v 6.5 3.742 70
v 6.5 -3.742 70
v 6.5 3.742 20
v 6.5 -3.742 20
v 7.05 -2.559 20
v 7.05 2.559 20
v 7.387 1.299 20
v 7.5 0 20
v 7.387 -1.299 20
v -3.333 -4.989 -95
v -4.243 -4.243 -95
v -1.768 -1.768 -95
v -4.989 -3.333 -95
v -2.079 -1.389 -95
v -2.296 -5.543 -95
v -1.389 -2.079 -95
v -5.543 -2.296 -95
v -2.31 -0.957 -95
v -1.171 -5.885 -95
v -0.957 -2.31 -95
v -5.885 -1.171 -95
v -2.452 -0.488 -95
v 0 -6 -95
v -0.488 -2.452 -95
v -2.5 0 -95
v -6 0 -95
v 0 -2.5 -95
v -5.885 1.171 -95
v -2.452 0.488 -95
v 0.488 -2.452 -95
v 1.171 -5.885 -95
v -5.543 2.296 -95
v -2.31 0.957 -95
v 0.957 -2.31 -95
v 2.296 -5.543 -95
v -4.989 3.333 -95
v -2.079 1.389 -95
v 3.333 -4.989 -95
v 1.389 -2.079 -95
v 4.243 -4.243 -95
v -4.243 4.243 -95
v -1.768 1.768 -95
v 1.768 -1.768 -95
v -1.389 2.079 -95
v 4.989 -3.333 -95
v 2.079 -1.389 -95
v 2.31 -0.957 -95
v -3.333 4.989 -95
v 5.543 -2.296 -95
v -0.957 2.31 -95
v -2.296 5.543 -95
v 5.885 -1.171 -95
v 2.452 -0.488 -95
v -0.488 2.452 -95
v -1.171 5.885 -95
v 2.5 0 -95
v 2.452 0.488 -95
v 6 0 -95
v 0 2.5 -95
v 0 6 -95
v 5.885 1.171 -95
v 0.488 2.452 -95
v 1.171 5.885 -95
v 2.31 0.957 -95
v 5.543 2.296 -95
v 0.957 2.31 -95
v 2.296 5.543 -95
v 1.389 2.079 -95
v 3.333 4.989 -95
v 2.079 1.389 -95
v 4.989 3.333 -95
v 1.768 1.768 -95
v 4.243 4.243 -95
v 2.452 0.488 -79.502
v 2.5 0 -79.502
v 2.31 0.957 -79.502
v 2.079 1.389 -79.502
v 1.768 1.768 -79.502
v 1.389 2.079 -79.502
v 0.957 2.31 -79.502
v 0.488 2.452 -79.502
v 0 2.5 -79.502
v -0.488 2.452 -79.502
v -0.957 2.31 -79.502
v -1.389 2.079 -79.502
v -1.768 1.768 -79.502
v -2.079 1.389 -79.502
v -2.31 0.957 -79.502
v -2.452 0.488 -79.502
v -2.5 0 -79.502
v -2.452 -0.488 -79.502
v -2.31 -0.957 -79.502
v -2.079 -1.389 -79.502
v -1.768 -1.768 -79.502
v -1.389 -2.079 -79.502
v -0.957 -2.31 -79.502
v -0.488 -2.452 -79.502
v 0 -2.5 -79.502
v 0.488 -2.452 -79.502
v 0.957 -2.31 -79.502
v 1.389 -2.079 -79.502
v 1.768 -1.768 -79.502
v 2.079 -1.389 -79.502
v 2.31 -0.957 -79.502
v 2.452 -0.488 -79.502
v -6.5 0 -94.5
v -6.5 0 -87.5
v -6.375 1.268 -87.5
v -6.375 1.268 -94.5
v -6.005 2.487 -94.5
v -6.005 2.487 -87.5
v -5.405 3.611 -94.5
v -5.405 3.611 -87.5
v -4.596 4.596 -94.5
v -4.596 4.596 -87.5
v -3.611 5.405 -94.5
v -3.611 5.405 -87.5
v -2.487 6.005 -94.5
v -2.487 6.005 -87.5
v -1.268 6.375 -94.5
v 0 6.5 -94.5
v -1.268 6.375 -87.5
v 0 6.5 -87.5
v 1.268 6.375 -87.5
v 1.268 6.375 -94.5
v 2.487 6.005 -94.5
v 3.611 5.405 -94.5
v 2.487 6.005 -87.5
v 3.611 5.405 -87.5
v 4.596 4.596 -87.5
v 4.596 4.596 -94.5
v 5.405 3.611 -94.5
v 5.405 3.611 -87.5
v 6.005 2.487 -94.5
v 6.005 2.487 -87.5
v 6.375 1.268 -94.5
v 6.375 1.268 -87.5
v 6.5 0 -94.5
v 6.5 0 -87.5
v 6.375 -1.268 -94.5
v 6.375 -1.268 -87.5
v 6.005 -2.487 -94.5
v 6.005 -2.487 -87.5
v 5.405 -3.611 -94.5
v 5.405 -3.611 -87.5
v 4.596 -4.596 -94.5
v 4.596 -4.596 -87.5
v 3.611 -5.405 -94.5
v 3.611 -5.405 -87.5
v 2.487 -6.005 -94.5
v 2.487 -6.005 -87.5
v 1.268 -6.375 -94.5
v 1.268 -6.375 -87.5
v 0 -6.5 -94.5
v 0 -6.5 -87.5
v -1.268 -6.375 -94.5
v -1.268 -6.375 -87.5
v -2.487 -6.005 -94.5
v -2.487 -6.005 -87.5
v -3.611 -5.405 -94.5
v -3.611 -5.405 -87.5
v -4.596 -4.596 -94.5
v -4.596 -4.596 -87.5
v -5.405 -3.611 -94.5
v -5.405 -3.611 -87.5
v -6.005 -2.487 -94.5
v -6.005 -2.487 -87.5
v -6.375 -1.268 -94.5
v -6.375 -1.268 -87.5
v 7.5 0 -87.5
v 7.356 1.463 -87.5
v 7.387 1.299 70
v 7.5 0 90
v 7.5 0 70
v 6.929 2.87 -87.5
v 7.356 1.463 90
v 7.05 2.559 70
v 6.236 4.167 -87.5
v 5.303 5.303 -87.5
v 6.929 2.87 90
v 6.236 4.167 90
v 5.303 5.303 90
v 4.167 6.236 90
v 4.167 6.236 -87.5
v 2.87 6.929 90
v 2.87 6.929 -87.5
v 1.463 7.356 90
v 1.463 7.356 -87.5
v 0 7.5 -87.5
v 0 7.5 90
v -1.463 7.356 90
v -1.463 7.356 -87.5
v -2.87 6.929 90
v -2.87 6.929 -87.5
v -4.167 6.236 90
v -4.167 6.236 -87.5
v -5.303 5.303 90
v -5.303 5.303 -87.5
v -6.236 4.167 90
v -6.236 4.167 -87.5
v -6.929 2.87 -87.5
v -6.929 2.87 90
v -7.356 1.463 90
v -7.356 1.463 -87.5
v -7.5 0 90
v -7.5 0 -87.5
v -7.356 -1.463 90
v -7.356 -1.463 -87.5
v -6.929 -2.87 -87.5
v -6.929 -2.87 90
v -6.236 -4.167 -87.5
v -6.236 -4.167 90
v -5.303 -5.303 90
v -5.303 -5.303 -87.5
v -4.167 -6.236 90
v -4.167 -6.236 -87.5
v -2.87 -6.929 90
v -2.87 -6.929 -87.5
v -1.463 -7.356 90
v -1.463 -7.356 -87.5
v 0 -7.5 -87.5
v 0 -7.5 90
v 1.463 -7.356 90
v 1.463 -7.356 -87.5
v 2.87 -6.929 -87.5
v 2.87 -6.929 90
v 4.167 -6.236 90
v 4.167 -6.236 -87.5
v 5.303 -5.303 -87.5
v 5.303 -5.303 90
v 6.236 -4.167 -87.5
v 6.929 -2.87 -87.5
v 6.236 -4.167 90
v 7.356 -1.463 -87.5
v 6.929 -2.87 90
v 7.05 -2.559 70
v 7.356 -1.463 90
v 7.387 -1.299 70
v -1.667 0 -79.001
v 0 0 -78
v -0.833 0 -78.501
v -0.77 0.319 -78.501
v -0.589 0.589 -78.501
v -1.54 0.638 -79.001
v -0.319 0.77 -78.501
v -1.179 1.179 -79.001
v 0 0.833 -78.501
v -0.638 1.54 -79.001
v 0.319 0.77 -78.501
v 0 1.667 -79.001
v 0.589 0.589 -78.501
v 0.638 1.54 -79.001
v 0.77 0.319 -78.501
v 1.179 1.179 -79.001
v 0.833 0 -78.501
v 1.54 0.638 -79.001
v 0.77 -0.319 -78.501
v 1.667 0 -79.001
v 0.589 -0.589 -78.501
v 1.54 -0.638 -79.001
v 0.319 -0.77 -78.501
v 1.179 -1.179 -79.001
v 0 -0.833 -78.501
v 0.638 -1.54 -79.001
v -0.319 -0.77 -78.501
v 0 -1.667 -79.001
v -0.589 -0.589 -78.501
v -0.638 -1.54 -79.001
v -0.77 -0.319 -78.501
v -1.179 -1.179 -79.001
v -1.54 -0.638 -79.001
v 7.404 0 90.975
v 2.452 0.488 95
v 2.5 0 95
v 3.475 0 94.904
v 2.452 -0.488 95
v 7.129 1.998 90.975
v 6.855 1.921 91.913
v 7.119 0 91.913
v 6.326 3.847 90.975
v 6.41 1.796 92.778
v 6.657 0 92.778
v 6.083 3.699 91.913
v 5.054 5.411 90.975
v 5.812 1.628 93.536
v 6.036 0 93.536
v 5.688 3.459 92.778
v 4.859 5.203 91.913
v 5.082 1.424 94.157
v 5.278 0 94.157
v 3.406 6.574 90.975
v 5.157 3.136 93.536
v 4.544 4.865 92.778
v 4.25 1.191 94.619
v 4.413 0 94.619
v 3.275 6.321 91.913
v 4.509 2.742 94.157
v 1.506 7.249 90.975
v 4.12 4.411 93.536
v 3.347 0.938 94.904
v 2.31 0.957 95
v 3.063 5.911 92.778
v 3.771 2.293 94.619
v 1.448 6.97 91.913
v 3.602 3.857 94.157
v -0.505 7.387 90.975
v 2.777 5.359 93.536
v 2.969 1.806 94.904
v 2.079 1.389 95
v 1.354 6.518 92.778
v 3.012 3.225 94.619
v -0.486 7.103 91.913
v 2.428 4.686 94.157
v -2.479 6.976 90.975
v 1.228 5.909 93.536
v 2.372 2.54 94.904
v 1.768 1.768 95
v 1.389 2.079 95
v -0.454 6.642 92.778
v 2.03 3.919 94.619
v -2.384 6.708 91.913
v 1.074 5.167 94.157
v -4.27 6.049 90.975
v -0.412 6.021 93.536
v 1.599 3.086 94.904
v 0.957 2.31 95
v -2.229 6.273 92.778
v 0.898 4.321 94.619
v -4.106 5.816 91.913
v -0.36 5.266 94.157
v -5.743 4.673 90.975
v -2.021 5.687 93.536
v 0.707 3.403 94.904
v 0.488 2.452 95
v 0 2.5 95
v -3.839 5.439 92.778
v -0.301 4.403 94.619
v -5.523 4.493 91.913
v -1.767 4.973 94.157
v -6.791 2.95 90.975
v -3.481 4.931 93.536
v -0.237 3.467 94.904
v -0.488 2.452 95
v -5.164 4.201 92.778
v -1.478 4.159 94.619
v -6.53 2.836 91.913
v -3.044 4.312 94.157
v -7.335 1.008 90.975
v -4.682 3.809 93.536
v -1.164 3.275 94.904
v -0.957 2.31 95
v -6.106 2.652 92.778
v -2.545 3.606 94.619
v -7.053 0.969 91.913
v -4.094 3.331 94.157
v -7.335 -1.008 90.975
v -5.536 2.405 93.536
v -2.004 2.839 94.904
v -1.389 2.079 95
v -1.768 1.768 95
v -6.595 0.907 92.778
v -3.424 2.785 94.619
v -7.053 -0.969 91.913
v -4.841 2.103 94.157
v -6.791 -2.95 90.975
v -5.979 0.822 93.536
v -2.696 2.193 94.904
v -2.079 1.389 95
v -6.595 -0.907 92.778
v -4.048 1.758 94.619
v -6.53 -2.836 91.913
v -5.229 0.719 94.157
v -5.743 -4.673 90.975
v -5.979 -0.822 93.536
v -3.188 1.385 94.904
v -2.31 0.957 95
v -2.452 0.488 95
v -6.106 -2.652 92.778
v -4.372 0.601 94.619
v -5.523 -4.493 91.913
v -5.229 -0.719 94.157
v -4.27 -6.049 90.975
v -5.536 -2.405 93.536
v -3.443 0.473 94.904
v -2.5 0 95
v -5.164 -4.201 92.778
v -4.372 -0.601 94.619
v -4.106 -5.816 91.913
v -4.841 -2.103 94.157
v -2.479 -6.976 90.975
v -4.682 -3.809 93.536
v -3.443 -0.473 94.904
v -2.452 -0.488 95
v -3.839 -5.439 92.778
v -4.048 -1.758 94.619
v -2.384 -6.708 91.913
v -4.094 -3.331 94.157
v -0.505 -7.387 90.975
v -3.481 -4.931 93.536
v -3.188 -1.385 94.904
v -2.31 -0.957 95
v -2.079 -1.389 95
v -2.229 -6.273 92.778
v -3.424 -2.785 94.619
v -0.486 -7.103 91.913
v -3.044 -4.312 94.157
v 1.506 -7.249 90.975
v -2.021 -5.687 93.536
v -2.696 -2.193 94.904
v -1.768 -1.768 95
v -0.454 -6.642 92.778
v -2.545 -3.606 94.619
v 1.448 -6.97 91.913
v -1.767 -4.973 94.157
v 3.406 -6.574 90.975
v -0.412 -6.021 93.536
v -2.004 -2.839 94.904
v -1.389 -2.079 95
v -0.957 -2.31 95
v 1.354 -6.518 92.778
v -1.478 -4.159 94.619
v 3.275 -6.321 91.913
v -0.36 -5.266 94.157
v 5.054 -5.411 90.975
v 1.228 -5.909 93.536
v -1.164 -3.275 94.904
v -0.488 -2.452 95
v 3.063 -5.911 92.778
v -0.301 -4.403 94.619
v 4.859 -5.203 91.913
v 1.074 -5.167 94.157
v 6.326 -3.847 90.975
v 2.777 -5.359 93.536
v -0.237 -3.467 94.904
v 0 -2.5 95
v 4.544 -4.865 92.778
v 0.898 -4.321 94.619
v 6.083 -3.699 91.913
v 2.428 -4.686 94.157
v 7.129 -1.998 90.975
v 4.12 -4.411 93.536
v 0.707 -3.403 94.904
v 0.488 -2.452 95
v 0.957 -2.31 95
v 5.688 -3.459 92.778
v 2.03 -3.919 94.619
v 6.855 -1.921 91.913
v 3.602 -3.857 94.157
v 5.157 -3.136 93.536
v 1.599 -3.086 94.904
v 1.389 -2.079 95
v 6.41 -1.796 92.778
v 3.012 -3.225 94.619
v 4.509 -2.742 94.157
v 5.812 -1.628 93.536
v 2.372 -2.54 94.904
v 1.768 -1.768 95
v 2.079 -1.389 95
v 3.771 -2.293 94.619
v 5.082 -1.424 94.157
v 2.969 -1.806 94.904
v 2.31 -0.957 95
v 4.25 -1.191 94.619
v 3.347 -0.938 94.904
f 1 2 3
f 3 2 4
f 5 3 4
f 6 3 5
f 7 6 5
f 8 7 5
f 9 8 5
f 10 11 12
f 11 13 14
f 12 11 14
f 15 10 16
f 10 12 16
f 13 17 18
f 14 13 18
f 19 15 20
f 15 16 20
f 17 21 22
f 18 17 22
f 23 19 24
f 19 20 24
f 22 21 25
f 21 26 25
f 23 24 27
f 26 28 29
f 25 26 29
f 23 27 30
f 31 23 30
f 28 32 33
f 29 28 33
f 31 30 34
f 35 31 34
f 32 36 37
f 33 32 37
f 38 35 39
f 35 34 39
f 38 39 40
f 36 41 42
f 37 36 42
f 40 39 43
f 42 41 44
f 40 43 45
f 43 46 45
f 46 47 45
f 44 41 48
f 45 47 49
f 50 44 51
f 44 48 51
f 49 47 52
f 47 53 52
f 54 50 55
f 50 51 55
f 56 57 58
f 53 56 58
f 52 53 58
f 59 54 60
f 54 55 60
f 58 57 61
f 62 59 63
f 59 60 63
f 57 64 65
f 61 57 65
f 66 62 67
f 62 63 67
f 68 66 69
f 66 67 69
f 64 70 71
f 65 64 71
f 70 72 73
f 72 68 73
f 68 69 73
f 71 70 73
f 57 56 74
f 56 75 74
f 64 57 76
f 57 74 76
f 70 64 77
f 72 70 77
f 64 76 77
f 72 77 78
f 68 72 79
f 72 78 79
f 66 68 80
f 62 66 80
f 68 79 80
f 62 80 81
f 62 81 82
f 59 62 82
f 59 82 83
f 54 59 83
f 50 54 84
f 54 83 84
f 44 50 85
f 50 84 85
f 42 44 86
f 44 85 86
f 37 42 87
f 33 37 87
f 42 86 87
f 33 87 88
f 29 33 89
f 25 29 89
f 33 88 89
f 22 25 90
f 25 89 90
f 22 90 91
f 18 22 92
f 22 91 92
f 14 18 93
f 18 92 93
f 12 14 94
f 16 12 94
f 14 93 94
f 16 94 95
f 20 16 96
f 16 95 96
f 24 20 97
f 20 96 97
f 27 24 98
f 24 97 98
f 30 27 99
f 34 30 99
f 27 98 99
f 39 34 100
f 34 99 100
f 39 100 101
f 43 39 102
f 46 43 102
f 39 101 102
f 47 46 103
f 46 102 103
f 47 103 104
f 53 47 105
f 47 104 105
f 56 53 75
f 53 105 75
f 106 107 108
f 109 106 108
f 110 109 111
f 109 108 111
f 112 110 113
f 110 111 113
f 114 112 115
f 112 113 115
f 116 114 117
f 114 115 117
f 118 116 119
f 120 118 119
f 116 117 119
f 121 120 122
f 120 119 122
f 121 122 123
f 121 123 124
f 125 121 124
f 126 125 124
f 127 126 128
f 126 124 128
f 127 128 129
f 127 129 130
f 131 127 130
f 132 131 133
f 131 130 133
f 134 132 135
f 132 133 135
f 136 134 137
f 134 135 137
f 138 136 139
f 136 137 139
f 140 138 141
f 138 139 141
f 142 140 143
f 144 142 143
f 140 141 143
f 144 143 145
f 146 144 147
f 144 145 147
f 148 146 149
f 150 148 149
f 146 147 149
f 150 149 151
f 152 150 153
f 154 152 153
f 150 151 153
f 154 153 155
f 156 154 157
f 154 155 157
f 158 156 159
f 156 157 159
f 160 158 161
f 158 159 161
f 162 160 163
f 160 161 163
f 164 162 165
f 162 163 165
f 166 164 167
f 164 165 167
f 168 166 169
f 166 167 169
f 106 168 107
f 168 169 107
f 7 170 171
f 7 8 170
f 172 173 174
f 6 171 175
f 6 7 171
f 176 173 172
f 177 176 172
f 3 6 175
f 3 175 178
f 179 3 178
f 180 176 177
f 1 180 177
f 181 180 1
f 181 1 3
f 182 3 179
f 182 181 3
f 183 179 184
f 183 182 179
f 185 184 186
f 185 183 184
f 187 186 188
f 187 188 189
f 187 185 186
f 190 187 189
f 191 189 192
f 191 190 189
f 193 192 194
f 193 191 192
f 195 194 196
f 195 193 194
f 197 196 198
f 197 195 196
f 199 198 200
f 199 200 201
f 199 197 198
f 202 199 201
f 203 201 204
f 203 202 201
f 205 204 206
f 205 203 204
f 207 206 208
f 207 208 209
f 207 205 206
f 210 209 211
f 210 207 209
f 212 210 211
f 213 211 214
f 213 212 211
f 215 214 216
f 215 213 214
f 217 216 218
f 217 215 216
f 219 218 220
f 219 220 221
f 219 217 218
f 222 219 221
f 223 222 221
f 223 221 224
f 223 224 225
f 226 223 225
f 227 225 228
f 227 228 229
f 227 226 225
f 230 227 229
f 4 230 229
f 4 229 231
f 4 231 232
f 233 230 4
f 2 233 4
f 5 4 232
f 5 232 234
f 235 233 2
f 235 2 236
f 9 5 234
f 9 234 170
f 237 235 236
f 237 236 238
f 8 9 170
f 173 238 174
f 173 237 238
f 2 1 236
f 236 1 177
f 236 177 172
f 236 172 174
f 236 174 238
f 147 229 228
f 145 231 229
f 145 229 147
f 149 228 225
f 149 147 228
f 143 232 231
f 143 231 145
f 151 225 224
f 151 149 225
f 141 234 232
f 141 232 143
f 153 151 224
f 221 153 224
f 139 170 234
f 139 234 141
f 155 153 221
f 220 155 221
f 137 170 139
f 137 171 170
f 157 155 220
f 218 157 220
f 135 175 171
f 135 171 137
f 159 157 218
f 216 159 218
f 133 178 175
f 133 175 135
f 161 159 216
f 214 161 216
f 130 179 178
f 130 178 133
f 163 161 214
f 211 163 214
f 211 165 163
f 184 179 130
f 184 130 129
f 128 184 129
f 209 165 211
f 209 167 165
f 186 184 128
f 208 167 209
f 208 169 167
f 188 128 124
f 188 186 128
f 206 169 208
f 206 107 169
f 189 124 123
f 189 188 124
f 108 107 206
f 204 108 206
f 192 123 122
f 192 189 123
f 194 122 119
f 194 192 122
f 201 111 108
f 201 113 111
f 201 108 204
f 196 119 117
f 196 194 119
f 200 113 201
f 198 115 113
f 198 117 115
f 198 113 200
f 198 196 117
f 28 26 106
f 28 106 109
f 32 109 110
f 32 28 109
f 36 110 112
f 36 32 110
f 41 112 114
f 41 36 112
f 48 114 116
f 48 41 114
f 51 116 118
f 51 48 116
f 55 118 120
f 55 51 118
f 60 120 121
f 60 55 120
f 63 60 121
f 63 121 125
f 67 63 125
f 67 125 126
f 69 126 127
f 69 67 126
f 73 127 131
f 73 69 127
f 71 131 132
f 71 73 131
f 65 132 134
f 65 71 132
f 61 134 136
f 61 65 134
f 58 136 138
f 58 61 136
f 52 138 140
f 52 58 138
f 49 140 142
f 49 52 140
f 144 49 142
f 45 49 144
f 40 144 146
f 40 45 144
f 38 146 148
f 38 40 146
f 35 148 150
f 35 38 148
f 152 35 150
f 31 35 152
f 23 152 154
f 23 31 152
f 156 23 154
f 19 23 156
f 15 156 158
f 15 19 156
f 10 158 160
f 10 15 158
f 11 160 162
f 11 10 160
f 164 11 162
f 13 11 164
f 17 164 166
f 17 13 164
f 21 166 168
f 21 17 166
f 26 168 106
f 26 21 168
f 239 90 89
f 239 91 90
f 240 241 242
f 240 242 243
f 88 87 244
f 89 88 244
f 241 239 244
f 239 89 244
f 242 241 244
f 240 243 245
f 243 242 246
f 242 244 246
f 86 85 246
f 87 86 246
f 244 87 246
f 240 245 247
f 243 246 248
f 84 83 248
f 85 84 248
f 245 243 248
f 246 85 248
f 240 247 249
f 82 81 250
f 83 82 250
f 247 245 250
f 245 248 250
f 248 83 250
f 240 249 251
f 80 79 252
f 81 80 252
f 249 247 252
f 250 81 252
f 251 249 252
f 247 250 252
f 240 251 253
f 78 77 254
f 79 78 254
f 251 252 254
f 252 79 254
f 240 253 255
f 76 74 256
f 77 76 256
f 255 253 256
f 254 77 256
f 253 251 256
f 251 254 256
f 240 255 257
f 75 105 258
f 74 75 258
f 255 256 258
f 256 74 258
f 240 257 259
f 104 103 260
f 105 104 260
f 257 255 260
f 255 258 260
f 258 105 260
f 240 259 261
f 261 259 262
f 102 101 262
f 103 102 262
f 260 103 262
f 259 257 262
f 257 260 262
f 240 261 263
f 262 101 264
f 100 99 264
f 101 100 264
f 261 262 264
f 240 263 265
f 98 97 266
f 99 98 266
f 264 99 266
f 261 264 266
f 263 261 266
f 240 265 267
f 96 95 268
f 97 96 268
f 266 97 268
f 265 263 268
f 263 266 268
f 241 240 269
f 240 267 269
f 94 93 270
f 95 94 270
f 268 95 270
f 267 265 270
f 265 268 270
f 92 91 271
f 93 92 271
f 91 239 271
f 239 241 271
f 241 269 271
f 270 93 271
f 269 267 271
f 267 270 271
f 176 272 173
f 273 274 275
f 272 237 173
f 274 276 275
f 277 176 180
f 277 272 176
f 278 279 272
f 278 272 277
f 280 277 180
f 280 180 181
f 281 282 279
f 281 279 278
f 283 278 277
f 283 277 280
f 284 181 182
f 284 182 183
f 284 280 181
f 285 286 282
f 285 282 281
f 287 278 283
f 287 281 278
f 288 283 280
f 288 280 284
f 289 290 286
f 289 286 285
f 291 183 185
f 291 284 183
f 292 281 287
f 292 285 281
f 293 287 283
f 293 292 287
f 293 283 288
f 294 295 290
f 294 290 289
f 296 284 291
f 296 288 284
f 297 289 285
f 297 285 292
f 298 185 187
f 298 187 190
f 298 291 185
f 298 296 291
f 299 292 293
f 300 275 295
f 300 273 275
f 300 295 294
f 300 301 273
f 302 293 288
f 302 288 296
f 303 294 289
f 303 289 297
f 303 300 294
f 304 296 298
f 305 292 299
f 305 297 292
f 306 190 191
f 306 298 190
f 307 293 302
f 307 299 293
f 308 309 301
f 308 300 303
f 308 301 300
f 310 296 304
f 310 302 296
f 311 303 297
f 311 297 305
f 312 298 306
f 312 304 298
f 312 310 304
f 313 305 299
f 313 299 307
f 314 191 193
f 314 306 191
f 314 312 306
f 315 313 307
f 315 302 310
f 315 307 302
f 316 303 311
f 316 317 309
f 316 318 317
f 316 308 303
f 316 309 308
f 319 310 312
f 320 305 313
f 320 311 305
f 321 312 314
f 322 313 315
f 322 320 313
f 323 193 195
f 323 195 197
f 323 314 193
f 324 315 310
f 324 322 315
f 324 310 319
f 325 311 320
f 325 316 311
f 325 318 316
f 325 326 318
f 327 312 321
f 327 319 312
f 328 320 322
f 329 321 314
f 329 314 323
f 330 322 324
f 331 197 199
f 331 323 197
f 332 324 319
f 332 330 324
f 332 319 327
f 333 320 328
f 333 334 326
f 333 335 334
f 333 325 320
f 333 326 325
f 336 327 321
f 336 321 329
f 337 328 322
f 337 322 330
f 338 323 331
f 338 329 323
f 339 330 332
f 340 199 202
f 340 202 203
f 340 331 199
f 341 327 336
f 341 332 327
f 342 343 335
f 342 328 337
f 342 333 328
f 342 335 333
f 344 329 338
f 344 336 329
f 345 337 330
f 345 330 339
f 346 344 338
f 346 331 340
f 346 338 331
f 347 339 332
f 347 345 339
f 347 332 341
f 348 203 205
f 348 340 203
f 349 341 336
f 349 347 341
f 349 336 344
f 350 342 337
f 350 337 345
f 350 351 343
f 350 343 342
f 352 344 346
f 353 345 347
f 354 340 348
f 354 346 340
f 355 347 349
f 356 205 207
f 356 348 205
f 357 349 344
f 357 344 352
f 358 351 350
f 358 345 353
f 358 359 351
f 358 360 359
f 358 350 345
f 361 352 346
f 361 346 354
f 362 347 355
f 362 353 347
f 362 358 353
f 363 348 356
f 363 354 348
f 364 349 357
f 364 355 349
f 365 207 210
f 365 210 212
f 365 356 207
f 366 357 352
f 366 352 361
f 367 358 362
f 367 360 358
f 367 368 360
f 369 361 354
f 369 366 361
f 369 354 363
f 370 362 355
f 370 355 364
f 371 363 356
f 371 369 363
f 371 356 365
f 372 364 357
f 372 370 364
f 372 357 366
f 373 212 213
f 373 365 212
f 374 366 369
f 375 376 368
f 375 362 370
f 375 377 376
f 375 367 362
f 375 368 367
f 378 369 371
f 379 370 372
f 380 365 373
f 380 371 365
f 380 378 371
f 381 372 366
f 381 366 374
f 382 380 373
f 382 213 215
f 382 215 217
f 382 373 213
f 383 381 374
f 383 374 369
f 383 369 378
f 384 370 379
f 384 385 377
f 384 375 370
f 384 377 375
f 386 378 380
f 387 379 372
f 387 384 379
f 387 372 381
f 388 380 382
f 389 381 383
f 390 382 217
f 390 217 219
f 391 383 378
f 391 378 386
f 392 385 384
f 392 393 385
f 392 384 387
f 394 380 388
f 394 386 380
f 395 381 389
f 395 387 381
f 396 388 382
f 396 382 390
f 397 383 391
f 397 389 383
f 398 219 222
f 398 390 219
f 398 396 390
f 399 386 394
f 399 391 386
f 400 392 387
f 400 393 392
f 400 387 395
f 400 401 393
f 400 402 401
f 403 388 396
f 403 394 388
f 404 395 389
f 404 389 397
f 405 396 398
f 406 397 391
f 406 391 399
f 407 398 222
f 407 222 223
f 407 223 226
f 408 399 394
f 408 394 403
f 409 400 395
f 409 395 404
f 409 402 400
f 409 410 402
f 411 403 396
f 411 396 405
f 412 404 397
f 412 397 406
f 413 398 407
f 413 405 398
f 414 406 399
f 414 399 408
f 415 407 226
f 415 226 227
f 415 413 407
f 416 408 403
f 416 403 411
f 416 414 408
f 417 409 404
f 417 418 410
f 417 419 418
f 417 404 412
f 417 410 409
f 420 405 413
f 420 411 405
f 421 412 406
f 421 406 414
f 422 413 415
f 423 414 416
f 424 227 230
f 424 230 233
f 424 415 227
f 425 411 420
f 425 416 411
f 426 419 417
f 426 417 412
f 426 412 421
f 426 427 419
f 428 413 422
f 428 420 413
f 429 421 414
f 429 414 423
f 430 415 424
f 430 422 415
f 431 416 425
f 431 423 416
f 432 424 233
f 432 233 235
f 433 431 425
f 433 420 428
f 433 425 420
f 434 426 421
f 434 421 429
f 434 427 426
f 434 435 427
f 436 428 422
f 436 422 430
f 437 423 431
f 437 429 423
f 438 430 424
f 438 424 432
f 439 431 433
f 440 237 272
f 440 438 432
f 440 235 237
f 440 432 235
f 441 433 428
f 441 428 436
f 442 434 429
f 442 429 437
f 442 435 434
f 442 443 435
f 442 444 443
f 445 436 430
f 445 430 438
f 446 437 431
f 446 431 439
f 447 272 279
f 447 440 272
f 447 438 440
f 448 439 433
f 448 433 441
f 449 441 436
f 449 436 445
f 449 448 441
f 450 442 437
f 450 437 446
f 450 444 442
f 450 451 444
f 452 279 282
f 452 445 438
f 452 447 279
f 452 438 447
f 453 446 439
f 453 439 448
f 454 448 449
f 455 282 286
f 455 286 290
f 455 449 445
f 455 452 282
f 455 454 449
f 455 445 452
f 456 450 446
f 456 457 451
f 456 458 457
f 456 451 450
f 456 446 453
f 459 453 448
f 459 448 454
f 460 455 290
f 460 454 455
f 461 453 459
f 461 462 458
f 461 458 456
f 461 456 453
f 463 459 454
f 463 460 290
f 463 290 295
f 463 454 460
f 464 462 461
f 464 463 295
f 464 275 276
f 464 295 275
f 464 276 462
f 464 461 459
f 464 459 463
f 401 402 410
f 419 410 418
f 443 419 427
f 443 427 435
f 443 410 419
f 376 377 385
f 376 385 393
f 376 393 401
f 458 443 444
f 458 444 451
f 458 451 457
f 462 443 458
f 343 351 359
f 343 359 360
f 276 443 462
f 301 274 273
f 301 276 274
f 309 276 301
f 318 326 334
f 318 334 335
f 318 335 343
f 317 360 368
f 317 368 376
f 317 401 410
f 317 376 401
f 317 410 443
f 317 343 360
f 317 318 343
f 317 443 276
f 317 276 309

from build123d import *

# Parameters (mm, degrees)
ESBO_O1_R                     = 7.5
RESSALTO_EXTRUS_O1_DEPTH      = 95
CORTE_EXTRUS_O1_START         = -7.5
ESBO_O2_R                     = 7.5
ESBO_O2_R_2                   = 6.5
CORTE_EXTRUS_O1_DEPTH         = 7.5
FILETE1_R                     = 5
FURO_ROSCADO_DE_M6X1_01_D     = 5
FURO_ROSCADO_DE_M6X1_01_DEPTH = 15.497848452
FURO_ROSCADO_DE_M6X1_01_TIP   = 1.502151548
CHANFRO1_SIZE                 = 0.5
CORTE_EXTRUS_O2_DEPTH         = 96.590271472
CORTE_EXTRUS_O2_DEPTH_BACK    = 96.590271472
ESBO_O8_W                     = 1
ESBO_O8_H                     = 50


with BuildPart() as part:
    # Esboço1 → Ressalto-extrusão1 (new, symmetric)
    with BuildSketch(Plane.XY):
        Circle(ESBO_O1_R)
    extrude(amount=RESSALTO_EXTRUS_O1_DEPTH, both=True)

    # Esboço2 → Corte-extrusão1 (cut)
    with BuildSketch(Plane(origin=(0, 0, -95), x_dir=(-1, 0, 0), z_dir=(0, 0, -1)).offset(CORTE_EXTRUS_O1_START)):
        Circle(ESBO_O2_R)
        Circle(ESBO_O2_R_2, mode=Mode.SUBTRACT)
    extrude(amount=CORTE_EXTRUS_O1_DEPTH, mode=Mode.SUBTRACT)

    # Filete1
    filete1_edges = [part.edges().sort_by_distance(p)[0] for p in [
        (-7.5, 0, 95),
    ]]
    fillet(filete1_edges, radius=FILETE1_R)

    # Furo roscado de M6x1.01
    with Locations(Plane(origin=(0, 0, -95), x_dir=(-1, 0, 0), z_dir=(0, 0, -1))):
        with Locations((0, 0)):
            Hole(FURO_ROSCADO_DE_M6X1_01_D / 2, depth=FURO_ROSCADO_DE_M6X1_01_DEPTH)
            with Locations((0, 0, -(FURO_ROSCADO_DE_M6X1_01_DEPTH + FURO_ROSCADO_DE_M6X1_01_TIP / 2))):  # 118° drill point
                Cone(0, FURO_ROSCADO_DE_M6X1_01_D / 2, FURO_ROSCADO_DE_M6X1_01_TIP, mode=Mode.SUBTRACT)

    # Chanfro1
    chanfro1_edges = [part.edges().sort_by_distance(p)[0] for p in [
        (6.5, 0, -95),
    ]]
    chamfer(chanfro1_edges, length=CHANFRO1_SIZE)

    # Esboço8 → Corte-extrusão2 (cut, two sides: drawn at the far end of the back side and taken through both)
    with BuildSketch(Plane(origin=(0, 0, 0), x_dir=(1, 0, 0), z_dir=(0, 1, 0)).offset(-CORTE_EXTRUS_O2_DEPTH_BACK)):
        with Locations((7, -45)):
            Rectangle(ESBO_O8_W, ESBO_O8_H)
    extrude(amount=CORTE_EXTRUS_O2_DEPTH + CORTE_EXTRUS_O2_DEPTH_BACK, mode=Mode.SUBTRACT)


solid = part.part
